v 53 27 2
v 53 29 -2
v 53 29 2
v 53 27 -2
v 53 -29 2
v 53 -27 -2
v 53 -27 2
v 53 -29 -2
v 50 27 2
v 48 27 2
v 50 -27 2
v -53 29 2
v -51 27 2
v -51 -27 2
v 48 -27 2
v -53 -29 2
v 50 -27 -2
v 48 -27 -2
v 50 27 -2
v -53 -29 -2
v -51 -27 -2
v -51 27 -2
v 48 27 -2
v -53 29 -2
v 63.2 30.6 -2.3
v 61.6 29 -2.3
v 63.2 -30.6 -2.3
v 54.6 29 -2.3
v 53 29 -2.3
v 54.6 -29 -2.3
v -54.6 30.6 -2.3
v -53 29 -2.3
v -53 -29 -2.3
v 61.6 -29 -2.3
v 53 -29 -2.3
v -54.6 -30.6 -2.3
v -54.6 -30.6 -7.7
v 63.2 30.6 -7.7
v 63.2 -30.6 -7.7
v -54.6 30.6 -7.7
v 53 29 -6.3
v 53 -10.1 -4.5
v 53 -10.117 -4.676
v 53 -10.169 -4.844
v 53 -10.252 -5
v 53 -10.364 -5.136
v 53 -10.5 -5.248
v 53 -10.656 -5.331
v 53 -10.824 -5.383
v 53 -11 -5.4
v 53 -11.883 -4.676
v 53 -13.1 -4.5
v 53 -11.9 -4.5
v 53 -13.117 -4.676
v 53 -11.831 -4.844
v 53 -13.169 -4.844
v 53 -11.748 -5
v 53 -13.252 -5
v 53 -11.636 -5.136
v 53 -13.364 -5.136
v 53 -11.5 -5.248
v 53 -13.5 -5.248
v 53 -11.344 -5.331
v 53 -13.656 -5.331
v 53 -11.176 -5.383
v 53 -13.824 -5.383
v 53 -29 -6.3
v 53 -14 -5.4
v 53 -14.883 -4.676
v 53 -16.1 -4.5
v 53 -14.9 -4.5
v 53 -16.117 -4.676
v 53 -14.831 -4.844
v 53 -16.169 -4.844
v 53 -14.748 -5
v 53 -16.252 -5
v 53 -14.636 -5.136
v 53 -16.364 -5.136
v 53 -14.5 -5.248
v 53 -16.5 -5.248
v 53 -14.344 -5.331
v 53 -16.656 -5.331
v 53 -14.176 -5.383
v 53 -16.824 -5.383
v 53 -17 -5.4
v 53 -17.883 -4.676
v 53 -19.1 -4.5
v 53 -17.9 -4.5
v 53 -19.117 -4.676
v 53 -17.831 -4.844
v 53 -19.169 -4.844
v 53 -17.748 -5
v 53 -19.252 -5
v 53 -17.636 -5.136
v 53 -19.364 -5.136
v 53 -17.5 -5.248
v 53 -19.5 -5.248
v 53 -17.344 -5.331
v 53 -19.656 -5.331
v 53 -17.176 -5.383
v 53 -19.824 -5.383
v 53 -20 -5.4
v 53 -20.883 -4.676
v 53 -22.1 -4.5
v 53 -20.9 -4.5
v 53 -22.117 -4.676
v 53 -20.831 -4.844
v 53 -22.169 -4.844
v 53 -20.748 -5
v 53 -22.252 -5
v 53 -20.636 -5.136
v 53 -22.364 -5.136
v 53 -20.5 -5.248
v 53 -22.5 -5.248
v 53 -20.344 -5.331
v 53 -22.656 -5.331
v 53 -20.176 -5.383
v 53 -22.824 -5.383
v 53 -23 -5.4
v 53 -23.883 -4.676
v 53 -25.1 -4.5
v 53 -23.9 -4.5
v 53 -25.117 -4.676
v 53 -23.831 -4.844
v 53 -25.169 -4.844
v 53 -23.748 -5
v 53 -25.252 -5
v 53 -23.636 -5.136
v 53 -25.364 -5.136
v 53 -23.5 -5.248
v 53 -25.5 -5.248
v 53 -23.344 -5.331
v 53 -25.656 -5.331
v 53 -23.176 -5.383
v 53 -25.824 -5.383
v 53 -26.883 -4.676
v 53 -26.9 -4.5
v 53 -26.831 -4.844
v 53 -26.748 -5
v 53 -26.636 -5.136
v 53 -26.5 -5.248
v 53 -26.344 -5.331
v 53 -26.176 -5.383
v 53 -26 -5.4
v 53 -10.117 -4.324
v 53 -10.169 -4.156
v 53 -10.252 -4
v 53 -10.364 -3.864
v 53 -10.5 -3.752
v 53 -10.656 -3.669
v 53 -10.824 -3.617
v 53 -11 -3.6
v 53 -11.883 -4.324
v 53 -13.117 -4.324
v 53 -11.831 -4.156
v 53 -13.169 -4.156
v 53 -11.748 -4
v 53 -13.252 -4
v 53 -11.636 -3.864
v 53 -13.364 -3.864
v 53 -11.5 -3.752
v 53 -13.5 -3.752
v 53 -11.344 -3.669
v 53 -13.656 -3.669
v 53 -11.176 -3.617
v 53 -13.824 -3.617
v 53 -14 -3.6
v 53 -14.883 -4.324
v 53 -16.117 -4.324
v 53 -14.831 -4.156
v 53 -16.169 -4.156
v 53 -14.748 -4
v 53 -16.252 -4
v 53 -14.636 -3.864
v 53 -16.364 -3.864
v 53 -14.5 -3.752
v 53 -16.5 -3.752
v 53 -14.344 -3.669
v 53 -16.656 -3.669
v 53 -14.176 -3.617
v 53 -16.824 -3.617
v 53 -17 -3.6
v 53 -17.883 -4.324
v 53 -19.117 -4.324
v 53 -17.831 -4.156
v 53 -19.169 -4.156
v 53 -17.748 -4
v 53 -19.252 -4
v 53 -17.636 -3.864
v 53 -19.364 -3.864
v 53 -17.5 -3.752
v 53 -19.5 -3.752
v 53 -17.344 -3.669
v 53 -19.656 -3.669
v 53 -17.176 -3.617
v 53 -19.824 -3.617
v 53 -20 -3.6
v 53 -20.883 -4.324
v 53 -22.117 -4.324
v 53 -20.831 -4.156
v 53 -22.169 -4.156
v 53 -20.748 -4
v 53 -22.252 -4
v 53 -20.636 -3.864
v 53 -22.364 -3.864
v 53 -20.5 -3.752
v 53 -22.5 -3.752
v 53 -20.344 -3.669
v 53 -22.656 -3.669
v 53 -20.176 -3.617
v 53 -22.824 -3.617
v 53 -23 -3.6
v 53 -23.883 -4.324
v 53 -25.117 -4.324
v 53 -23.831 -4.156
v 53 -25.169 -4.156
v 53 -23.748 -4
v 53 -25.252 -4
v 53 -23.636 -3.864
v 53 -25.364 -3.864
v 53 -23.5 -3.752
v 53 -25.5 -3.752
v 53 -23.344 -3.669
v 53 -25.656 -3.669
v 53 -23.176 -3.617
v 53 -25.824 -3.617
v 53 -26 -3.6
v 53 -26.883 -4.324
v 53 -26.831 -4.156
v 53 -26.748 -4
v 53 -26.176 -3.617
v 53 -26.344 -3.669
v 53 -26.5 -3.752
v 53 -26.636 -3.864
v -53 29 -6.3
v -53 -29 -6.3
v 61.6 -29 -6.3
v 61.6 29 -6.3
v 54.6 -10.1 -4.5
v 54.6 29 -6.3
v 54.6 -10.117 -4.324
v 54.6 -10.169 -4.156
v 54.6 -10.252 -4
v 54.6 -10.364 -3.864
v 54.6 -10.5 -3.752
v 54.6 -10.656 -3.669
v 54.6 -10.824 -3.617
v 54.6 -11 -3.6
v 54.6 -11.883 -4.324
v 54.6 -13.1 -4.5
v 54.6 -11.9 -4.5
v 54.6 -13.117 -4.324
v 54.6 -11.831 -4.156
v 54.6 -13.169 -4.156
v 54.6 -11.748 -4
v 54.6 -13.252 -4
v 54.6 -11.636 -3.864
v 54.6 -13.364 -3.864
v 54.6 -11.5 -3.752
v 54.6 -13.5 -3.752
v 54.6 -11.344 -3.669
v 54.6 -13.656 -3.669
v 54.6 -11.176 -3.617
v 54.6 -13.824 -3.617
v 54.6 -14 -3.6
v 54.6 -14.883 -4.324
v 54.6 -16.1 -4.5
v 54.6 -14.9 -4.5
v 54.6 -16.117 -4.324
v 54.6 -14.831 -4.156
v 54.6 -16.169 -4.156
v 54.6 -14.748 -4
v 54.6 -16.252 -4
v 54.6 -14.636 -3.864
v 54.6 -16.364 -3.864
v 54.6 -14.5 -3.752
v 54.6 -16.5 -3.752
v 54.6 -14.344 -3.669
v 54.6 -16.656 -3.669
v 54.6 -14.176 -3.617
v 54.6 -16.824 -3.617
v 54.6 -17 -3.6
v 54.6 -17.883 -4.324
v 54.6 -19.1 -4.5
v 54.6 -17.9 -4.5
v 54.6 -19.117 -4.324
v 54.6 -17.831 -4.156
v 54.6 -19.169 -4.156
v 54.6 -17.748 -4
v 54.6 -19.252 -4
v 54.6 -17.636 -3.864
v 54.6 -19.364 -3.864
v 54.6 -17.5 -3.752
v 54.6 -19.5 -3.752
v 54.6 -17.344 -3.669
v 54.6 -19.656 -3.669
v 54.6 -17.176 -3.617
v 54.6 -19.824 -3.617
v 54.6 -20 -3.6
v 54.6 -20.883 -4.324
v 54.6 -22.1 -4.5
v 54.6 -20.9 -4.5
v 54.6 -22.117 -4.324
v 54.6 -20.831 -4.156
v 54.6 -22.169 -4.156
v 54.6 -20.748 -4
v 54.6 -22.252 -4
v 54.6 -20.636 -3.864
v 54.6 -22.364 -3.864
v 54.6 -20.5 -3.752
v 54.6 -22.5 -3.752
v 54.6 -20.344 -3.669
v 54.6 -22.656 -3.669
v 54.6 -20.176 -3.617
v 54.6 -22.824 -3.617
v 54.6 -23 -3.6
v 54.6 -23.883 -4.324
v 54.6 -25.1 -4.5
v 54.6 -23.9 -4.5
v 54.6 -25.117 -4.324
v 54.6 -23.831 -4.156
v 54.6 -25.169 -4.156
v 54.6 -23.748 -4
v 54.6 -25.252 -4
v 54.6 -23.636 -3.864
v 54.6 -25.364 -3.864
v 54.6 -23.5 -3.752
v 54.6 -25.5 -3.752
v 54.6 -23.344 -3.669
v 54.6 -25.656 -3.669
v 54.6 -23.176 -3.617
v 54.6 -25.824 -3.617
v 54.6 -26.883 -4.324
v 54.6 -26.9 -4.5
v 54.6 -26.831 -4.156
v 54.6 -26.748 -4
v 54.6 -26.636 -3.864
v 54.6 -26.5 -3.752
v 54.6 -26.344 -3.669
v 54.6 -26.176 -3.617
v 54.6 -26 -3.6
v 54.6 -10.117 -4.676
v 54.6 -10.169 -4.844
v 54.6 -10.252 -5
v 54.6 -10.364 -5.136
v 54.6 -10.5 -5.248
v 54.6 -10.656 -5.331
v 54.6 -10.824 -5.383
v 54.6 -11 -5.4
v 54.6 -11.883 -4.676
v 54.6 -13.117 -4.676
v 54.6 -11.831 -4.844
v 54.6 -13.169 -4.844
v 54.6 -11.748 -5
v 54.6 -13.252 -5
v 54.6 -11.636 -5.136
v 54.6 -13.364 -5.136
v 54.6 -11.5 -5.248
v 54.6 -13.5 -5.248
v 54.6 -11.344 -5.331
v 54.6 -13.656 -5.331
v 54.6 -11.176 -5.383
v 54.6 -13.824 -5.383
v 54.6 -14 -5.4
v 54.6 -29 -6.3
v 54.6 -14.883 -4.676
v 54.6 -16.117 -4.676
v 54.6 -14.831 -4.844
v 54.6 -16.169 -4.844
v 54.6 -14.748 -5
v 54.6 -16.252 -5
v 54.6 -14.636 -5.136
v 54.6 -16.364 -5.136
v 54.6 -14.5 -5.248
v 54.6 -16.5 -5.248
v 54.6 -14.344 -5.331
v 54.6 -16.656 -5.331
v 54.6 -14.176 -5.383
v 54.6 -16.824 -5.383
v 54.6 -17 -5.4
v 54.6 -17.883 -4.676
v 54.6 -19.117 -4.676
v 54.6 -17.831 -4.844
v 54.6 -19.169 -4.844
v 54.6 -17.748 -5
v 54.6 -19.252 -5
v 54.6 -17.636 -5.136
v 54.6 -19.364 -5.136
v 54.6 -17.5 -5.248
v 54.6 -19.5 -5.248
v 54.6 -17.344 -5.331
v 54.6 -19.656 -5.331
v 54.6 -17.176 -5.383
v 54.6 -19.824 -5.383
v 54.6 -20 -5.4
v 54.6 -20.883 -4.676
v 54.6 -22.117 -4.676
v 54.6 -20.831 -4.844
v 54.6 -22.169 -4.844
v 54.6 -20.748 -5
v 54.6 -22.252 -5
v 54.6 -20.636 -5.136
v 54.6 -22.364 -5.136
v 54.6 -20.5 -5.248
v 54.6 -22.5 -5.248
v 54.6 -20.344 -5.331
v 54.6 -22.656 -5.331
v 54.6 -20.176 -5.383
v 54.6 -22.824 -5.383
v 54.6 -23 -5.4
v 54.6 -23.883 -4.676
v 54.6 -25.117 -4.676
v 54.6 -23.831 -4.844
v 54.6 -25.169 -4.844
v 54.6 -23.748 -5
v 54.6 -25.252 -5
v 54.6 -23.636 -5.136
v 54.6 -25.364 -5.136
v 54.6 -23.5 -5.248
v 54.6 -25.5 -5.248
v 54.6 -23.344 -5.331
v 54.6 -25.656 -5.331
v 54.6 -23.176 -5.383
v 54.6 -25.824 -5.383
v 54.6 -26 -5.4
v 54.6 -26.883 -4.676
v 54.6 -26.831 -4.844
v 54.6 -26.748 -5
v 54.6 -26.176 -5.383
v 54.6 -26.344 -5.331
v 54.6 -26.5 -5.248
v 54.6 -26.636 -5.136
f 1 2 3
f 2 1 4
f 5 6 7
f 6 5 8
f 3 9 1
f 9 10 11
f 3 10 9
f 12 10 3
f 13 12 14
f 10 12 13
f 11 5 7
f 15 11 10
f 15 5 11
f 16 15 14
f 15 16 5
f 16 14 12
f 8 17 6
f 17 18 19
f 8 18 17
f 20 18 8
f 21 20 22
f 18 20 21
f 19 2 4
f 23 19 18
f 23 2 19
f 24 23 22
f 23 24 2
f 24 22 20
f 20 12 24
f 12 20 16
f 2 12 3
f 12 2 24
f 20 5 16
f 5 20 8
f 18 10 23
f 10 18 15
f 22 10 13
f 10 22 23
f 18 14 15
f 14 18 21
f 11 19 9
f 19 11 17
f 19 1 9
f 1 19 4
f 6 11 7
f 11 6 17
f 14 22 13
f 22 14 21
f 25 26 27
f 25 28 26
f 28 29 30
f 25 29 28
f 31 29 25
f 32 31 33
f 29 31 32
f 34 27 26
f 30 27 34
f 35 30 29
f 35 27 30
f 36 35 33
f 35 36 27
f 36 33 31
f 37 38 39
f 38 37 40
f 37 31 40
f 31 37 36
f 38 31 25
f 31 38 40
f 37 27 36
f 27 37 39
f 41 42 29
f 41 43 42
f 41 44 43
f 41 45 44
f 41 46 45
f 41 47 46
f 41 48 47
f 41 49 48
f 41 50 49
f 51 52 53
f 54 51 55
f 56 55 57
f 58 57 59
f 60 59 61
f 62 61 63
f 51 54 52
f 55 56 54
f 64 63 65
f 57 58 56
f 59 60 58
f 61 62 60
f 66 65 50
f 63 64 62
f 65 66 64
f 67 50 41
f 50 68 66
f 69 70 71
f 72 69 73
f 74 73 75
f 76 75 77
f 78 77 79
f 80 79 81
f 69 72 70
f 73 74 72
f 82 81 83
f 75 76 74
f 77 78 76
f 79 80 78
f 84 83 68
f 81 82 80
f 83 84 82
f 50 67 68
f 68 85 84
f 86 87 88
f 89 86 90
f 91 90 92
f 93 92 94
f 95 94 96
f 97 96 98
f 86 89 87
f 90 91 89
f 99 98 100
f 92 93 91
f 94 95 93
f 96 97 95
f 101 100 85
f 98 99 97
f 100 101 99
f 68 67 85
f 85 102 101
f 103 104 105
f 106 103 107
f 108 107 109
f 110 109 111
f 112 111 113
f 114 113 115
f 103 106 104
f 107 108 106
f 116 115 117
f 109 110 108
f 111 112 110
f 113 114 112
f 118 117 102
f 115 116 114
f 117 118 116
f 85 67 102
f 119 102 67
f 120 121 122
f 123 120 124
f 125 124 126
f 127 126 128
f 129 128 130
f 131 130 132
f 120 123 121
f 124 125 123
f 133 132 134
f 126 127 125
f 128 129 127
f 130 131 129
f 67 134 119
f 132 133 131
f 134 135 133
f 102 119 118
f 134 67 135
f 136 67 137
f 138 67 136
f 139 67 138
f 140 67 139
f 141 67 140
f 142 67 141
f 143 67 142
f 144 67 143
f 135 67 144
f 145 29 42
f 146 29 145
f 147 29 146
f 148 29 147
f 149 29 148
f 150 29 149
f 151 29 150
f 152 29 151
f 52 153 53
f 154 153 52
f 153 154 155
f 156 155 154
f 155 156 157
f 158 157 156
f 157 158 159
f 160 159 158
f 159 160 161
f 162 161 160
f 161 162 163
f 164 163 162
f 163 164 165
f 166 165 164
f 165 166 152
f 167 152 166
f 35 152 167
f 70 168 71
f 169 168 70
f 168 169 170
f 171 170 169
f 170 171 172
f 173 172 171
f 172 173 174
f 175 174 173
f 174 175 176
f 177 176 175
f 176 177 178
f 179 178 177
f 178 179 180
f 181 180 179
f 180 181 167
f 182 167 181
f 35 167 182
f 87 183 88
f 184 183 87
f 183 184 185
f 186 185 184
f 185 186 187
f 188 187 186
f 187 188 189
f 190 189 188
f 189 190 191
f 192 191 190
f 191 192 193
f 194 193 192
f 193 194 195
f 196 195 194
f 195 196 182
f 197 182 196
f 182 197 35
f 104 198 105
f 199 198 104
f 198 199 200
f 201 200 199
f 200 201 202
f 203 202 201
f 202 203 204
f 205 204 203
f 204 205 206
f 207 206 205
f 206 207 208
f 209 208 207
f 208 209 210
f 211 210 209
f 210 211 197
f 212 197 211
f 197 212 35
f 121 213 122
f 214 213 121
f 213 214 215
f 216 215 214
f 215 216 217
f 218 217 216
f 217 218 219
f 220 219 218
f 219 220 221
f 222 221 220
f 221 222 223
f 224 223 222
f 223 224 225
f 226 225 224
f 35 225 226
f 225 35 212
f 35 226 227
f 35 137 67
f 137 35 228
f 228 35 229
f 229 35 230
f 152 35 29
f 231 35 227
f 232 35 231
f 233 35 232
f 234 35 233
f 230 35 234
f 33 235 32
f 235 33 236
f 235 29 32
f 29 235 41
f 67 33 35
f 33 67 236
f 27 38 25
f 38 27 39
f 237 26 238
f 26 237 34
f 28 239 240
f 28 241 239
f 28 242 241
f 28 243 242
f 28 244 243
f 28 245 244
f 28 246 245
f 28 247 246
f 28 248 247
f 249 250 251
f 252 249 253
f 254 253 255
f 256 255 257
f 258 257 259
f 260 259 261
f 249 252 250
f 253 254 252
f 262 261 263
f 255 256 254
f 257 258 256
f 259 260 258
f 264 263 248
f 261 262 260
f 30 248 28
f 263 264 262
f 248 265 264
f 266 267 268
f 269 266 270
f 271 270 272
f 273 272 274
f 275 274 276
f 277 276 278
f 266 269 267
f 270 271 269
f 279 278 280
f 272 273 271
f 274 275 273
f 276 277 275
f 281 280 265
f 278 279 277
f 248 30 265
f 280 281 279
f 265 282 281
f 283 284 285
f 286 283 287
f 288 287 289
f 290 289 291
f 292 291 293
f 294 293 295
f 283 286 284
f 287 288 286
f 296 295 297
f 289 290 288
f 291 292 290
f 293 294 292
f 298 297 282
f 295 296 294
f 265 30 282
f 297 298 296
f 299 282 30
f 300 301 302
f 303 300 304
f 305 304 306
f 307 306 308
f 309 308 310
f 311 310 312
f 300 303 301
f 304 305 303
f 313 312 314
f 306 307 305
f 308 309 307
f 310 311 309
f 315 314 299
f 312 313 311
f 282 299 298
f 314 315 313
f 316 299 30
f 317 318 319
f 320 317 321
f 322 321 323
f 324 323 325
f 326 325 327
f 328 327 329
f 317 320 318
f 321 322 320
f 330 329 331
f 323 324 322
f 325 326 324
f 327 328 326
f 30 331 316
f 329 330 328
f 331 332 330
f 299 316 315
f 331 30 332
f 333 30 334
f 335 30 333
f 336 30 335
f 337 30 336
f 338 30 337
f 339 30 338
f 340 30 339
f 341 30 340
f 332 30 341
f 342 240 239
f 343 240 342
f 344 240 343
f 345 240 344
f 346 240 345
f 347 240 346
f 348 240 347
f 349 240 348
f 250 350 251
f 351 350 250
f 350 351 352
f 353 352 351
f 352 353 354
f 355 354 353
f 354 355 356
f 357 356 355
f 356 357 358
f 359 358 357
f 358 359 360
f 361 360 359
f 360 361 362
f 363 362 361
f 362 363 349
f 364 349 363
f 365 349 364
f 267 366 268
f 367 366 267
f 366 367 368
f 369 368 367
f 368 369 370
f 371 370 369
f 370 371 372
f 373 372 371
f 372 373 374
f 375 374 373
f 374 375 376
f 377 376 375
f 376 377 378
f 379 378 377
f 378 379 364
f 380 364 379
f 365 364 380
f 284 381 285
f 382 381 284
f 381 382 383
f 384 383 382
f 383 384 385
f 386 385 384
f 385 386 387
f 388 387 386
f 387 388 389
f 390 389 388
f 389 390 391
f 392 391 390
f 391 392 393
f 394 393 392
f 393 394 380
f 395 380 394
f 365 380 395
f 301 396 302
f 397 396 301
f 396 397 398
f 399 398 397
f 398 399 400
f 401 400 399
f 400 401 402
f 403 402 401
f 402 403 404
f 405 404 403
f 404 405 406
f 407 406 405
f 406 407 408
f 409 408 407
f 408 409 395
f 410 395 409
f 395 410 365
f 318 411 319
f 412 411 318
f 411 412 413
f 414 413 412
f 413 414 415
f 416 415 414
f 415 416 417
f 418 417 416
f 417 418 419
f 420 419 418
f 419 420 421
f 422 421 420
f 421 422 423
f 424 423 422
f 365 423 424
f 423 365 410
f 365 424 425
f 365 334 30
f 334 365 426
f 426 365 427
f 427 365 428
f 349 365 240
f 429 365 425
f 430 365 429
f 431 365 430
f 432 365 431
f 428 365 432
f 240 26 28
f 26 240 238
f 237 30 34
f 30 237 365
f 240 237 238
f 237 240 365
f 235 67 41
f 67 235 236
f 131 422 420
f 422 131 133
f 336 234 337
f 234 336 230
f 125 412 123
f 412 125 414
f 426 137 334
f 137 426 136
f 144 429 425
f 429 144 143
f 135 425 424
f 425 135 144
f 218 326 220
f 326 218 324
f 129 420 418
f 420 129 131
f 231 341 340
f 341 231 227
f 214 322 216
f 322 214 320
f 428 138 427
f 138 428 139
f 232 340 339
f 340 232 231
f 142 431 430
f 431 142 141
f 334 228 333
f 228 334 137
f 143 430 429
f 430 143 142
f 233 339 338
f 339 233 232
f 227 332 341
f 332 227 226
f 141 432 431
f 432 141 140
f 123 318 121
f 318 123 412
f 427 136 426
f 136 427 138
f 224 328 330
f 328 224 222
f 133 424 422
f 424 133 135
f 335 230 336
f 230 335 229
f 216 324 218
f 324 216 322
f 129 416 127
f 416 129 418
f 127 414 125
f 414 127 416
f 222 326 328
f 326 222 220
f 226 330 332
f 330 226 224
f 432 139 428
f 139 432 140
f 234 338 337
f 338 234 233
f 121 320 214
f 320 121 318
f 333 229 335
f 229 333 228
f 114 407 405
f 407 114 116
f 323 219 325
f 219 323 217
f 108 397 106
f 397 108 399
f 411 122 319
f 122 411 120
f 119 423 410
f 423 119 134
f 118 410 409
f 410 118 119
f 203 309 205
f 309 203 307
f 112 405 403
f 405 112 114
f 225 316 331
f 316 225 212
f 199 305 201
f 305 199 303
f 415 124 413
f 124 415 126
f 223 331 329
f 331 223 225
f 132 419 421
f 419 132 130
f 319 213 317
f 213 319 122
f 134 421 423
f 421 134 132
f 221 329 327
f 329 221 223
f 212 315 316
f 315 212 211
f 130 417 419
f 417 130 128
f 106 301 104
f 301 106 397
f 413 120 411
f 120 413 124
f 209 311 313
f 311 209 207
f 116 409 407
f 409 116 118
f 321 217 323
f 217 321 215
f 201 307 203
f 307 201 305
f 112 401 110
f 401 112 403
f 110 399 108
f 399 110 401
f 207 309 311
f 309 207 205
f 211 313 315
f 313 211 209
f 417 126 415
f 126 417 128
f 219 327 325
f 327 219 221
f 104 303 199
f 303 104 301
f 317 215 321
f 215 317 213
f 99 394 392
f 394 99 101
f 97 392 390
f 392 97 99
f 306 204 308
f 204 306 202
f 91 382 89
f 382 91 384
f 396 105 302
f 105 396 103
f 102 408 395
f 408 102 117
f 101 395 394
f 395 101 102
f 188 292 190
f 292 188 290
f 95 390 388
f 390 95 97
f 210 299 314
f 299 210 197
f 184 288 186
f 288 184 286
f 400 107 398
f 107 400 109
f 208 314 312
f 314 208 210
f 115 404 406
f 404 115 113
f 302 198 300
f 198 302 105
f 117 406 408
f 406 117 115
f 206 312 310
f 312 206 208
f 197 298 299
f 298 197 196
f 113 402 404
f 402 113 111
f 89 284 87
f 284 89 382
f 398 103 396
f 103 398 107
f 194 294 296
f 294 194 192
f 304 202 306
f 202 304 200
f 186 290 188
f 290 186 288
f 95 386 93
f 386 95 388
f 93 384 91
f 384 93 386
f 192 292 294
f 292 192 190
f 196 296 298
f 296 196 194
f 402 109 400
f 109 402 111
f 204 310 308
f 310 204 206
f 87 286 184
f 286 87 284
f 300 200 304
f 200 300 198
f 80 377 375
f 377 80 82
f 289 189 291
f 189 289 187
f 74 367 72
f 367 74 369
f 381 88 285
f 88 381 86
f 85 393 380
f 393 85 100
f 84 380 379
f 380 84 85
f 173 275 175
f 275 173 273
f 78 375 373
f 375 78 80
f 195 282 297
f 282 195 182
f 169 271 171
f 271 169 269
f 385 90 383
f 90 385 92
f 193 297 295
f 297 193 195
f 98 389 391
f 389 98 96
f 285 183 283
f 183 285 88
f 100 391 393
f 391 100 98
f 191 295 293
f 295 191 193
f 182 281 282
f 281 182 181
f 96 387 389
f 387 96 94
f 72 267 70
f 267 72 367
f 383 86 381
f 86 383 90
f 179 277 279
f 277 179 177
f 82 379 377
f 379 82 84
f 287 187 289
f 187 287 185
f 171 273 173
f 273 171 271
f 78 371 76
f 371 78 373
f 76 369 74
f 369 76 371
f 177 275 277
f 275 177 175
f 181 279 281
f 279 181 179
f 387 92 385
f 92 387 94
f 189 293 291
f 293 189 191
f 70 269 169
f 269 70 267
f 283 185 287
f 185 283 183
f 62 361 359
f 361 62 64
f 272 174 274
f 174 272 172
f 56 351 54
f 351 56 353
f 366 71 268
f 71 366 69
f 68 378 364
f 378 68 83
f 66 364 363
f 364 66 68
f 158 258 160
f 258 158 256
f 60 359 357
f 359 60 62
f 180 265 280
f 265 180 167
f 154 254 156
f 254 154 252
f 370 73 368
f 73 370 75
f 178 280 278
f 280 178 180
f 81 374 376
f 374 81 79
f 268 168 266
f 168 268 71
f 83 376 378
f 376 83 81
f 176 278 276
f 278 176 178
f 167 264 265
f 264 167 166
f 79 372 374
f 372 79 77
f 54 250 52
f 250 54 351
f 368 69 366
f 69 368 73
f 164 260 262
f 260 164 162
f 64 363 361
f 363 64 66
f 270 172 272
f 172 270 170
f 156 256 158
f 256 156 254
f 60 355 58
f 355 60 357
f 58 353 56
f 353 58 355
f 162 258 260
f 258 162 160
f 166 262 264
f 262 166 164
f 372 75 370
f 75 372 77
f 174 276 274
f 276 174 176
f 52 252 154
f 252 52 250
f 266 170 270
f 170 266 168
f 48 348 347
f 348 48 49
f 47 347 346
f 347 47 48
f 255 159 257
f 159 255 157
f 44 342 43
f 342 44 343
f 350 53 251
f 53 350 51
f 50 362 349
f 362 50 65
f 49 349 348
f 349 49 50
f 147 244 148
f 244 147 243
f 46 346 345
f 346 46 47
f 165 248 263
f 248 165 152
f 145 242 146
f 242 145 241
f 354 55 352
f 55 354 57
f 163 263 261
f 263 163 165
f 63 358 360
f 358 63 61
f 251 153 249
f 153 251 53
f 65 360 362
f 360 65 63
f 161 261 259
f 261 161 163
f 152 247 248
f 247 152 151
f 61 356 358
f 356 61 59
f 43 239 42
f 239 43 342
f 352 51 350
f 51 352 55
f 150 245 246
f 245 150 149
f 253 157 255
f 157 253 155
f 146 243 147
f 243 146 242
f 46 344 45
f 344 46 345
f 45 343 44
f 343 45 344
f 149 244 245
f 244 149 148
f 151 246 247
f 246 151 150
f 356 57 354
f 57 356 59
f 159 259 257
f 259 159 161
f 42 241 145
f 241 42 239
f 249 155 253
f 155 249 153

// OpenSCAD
len_bottom = 106;
depth_bottom = 58;
thickness_walls = 1.6;
// screen backlight panel
// height of frame without thickness bottom
height_frame = 4;
thickness_bottom = 1.4;
depth_pcb = 7; 

window_frame();

translate([0, 0, -5])
kit_frame();
// set_frame();
// frame_is_match();

module window_frame() {
  difference() {
    color("green")
    cube([len_bottom, depth_bottom, height_frame], true);
    cube([len_bottom-10, depth_bottom-4, height_frame+1], true);
    translate([len_bottom/2-1, 0, 0])
    cube([4, depth_bottom-4, height_frame+1], true);
    translate([-len_bottom/2+4, 0, 0])
    cube([4, depth_bottom-4, height_frame+1], true);
  }
}

module kit_frame() {
  difference() {
    set_frame();
    for(i=[1:6]){
      translate([len_bottom/2, -depth_bottom/2+3*i, 0.5])
      rotate([0, 90, 0])
      cylinder(d=1.8, h=5, center=true, $fn=32);
    }
    
  }  
}

module set_frame() {
  color("lime")
  translate([0, 0, -height_frame/2])
  bottom();
  frame();
  translate([len_bottom/2+depth_pcb/2+thickness_walls, 0, 0])
  set_frame_pcb();
}

module set_frame_pcb() {
  color("lime")
  translate([0, 0, -height_frame/2])
  bottom_pcb();
  frame_pcb();
}

module bottom_pcb() {
  cube([depth_pcb+2*thickness_walls, depth_bottom+2*thickness_walls, thickness_bottom], true);
}

module frame_pcb() {
  difference() {
    cube([depth_pcb+2*thickness_walls, depth_bottom+2*thickness_walls, thickness_bottom+height_frame], true);
    color("red")
    cube([depth_pcb, depth_bottom, thickness_bottom+height_frame+0.1], true);
  }
}

module bottom() {
  cube([len_bottom+2*thickness_walls, depth_bottom+2*thickness_walls, thickness_bottom], true);
}

module frame() {
  difference() {
    cube([len_bottom+2*thickness_walls, depth_bottom+2*thickness_walls, thickness_bottom+height_frame], true);
    color("red")
    cube([len_bottom, depth_bottom, thickness_bottom+height_frame+0.1], true);
  }
}

module frame_is_match() {
  difference() {
    set_frame();
    // cut is match
    translate([106/4, 0, 0])
    cube([106/2+4, 58+4, 4*2], true);
  }
  // is match wall
  translate([0, depth_bottom/2+thickness_walls/2, 0])
  cube([5, thickness_walls, thickness_bottom+height_frame], true);
  
  // is match bottom
  translate([0, depth_bottom/2-4, -height_frame/2])
  cube([5, 5, thickness_bottom], true);
}
